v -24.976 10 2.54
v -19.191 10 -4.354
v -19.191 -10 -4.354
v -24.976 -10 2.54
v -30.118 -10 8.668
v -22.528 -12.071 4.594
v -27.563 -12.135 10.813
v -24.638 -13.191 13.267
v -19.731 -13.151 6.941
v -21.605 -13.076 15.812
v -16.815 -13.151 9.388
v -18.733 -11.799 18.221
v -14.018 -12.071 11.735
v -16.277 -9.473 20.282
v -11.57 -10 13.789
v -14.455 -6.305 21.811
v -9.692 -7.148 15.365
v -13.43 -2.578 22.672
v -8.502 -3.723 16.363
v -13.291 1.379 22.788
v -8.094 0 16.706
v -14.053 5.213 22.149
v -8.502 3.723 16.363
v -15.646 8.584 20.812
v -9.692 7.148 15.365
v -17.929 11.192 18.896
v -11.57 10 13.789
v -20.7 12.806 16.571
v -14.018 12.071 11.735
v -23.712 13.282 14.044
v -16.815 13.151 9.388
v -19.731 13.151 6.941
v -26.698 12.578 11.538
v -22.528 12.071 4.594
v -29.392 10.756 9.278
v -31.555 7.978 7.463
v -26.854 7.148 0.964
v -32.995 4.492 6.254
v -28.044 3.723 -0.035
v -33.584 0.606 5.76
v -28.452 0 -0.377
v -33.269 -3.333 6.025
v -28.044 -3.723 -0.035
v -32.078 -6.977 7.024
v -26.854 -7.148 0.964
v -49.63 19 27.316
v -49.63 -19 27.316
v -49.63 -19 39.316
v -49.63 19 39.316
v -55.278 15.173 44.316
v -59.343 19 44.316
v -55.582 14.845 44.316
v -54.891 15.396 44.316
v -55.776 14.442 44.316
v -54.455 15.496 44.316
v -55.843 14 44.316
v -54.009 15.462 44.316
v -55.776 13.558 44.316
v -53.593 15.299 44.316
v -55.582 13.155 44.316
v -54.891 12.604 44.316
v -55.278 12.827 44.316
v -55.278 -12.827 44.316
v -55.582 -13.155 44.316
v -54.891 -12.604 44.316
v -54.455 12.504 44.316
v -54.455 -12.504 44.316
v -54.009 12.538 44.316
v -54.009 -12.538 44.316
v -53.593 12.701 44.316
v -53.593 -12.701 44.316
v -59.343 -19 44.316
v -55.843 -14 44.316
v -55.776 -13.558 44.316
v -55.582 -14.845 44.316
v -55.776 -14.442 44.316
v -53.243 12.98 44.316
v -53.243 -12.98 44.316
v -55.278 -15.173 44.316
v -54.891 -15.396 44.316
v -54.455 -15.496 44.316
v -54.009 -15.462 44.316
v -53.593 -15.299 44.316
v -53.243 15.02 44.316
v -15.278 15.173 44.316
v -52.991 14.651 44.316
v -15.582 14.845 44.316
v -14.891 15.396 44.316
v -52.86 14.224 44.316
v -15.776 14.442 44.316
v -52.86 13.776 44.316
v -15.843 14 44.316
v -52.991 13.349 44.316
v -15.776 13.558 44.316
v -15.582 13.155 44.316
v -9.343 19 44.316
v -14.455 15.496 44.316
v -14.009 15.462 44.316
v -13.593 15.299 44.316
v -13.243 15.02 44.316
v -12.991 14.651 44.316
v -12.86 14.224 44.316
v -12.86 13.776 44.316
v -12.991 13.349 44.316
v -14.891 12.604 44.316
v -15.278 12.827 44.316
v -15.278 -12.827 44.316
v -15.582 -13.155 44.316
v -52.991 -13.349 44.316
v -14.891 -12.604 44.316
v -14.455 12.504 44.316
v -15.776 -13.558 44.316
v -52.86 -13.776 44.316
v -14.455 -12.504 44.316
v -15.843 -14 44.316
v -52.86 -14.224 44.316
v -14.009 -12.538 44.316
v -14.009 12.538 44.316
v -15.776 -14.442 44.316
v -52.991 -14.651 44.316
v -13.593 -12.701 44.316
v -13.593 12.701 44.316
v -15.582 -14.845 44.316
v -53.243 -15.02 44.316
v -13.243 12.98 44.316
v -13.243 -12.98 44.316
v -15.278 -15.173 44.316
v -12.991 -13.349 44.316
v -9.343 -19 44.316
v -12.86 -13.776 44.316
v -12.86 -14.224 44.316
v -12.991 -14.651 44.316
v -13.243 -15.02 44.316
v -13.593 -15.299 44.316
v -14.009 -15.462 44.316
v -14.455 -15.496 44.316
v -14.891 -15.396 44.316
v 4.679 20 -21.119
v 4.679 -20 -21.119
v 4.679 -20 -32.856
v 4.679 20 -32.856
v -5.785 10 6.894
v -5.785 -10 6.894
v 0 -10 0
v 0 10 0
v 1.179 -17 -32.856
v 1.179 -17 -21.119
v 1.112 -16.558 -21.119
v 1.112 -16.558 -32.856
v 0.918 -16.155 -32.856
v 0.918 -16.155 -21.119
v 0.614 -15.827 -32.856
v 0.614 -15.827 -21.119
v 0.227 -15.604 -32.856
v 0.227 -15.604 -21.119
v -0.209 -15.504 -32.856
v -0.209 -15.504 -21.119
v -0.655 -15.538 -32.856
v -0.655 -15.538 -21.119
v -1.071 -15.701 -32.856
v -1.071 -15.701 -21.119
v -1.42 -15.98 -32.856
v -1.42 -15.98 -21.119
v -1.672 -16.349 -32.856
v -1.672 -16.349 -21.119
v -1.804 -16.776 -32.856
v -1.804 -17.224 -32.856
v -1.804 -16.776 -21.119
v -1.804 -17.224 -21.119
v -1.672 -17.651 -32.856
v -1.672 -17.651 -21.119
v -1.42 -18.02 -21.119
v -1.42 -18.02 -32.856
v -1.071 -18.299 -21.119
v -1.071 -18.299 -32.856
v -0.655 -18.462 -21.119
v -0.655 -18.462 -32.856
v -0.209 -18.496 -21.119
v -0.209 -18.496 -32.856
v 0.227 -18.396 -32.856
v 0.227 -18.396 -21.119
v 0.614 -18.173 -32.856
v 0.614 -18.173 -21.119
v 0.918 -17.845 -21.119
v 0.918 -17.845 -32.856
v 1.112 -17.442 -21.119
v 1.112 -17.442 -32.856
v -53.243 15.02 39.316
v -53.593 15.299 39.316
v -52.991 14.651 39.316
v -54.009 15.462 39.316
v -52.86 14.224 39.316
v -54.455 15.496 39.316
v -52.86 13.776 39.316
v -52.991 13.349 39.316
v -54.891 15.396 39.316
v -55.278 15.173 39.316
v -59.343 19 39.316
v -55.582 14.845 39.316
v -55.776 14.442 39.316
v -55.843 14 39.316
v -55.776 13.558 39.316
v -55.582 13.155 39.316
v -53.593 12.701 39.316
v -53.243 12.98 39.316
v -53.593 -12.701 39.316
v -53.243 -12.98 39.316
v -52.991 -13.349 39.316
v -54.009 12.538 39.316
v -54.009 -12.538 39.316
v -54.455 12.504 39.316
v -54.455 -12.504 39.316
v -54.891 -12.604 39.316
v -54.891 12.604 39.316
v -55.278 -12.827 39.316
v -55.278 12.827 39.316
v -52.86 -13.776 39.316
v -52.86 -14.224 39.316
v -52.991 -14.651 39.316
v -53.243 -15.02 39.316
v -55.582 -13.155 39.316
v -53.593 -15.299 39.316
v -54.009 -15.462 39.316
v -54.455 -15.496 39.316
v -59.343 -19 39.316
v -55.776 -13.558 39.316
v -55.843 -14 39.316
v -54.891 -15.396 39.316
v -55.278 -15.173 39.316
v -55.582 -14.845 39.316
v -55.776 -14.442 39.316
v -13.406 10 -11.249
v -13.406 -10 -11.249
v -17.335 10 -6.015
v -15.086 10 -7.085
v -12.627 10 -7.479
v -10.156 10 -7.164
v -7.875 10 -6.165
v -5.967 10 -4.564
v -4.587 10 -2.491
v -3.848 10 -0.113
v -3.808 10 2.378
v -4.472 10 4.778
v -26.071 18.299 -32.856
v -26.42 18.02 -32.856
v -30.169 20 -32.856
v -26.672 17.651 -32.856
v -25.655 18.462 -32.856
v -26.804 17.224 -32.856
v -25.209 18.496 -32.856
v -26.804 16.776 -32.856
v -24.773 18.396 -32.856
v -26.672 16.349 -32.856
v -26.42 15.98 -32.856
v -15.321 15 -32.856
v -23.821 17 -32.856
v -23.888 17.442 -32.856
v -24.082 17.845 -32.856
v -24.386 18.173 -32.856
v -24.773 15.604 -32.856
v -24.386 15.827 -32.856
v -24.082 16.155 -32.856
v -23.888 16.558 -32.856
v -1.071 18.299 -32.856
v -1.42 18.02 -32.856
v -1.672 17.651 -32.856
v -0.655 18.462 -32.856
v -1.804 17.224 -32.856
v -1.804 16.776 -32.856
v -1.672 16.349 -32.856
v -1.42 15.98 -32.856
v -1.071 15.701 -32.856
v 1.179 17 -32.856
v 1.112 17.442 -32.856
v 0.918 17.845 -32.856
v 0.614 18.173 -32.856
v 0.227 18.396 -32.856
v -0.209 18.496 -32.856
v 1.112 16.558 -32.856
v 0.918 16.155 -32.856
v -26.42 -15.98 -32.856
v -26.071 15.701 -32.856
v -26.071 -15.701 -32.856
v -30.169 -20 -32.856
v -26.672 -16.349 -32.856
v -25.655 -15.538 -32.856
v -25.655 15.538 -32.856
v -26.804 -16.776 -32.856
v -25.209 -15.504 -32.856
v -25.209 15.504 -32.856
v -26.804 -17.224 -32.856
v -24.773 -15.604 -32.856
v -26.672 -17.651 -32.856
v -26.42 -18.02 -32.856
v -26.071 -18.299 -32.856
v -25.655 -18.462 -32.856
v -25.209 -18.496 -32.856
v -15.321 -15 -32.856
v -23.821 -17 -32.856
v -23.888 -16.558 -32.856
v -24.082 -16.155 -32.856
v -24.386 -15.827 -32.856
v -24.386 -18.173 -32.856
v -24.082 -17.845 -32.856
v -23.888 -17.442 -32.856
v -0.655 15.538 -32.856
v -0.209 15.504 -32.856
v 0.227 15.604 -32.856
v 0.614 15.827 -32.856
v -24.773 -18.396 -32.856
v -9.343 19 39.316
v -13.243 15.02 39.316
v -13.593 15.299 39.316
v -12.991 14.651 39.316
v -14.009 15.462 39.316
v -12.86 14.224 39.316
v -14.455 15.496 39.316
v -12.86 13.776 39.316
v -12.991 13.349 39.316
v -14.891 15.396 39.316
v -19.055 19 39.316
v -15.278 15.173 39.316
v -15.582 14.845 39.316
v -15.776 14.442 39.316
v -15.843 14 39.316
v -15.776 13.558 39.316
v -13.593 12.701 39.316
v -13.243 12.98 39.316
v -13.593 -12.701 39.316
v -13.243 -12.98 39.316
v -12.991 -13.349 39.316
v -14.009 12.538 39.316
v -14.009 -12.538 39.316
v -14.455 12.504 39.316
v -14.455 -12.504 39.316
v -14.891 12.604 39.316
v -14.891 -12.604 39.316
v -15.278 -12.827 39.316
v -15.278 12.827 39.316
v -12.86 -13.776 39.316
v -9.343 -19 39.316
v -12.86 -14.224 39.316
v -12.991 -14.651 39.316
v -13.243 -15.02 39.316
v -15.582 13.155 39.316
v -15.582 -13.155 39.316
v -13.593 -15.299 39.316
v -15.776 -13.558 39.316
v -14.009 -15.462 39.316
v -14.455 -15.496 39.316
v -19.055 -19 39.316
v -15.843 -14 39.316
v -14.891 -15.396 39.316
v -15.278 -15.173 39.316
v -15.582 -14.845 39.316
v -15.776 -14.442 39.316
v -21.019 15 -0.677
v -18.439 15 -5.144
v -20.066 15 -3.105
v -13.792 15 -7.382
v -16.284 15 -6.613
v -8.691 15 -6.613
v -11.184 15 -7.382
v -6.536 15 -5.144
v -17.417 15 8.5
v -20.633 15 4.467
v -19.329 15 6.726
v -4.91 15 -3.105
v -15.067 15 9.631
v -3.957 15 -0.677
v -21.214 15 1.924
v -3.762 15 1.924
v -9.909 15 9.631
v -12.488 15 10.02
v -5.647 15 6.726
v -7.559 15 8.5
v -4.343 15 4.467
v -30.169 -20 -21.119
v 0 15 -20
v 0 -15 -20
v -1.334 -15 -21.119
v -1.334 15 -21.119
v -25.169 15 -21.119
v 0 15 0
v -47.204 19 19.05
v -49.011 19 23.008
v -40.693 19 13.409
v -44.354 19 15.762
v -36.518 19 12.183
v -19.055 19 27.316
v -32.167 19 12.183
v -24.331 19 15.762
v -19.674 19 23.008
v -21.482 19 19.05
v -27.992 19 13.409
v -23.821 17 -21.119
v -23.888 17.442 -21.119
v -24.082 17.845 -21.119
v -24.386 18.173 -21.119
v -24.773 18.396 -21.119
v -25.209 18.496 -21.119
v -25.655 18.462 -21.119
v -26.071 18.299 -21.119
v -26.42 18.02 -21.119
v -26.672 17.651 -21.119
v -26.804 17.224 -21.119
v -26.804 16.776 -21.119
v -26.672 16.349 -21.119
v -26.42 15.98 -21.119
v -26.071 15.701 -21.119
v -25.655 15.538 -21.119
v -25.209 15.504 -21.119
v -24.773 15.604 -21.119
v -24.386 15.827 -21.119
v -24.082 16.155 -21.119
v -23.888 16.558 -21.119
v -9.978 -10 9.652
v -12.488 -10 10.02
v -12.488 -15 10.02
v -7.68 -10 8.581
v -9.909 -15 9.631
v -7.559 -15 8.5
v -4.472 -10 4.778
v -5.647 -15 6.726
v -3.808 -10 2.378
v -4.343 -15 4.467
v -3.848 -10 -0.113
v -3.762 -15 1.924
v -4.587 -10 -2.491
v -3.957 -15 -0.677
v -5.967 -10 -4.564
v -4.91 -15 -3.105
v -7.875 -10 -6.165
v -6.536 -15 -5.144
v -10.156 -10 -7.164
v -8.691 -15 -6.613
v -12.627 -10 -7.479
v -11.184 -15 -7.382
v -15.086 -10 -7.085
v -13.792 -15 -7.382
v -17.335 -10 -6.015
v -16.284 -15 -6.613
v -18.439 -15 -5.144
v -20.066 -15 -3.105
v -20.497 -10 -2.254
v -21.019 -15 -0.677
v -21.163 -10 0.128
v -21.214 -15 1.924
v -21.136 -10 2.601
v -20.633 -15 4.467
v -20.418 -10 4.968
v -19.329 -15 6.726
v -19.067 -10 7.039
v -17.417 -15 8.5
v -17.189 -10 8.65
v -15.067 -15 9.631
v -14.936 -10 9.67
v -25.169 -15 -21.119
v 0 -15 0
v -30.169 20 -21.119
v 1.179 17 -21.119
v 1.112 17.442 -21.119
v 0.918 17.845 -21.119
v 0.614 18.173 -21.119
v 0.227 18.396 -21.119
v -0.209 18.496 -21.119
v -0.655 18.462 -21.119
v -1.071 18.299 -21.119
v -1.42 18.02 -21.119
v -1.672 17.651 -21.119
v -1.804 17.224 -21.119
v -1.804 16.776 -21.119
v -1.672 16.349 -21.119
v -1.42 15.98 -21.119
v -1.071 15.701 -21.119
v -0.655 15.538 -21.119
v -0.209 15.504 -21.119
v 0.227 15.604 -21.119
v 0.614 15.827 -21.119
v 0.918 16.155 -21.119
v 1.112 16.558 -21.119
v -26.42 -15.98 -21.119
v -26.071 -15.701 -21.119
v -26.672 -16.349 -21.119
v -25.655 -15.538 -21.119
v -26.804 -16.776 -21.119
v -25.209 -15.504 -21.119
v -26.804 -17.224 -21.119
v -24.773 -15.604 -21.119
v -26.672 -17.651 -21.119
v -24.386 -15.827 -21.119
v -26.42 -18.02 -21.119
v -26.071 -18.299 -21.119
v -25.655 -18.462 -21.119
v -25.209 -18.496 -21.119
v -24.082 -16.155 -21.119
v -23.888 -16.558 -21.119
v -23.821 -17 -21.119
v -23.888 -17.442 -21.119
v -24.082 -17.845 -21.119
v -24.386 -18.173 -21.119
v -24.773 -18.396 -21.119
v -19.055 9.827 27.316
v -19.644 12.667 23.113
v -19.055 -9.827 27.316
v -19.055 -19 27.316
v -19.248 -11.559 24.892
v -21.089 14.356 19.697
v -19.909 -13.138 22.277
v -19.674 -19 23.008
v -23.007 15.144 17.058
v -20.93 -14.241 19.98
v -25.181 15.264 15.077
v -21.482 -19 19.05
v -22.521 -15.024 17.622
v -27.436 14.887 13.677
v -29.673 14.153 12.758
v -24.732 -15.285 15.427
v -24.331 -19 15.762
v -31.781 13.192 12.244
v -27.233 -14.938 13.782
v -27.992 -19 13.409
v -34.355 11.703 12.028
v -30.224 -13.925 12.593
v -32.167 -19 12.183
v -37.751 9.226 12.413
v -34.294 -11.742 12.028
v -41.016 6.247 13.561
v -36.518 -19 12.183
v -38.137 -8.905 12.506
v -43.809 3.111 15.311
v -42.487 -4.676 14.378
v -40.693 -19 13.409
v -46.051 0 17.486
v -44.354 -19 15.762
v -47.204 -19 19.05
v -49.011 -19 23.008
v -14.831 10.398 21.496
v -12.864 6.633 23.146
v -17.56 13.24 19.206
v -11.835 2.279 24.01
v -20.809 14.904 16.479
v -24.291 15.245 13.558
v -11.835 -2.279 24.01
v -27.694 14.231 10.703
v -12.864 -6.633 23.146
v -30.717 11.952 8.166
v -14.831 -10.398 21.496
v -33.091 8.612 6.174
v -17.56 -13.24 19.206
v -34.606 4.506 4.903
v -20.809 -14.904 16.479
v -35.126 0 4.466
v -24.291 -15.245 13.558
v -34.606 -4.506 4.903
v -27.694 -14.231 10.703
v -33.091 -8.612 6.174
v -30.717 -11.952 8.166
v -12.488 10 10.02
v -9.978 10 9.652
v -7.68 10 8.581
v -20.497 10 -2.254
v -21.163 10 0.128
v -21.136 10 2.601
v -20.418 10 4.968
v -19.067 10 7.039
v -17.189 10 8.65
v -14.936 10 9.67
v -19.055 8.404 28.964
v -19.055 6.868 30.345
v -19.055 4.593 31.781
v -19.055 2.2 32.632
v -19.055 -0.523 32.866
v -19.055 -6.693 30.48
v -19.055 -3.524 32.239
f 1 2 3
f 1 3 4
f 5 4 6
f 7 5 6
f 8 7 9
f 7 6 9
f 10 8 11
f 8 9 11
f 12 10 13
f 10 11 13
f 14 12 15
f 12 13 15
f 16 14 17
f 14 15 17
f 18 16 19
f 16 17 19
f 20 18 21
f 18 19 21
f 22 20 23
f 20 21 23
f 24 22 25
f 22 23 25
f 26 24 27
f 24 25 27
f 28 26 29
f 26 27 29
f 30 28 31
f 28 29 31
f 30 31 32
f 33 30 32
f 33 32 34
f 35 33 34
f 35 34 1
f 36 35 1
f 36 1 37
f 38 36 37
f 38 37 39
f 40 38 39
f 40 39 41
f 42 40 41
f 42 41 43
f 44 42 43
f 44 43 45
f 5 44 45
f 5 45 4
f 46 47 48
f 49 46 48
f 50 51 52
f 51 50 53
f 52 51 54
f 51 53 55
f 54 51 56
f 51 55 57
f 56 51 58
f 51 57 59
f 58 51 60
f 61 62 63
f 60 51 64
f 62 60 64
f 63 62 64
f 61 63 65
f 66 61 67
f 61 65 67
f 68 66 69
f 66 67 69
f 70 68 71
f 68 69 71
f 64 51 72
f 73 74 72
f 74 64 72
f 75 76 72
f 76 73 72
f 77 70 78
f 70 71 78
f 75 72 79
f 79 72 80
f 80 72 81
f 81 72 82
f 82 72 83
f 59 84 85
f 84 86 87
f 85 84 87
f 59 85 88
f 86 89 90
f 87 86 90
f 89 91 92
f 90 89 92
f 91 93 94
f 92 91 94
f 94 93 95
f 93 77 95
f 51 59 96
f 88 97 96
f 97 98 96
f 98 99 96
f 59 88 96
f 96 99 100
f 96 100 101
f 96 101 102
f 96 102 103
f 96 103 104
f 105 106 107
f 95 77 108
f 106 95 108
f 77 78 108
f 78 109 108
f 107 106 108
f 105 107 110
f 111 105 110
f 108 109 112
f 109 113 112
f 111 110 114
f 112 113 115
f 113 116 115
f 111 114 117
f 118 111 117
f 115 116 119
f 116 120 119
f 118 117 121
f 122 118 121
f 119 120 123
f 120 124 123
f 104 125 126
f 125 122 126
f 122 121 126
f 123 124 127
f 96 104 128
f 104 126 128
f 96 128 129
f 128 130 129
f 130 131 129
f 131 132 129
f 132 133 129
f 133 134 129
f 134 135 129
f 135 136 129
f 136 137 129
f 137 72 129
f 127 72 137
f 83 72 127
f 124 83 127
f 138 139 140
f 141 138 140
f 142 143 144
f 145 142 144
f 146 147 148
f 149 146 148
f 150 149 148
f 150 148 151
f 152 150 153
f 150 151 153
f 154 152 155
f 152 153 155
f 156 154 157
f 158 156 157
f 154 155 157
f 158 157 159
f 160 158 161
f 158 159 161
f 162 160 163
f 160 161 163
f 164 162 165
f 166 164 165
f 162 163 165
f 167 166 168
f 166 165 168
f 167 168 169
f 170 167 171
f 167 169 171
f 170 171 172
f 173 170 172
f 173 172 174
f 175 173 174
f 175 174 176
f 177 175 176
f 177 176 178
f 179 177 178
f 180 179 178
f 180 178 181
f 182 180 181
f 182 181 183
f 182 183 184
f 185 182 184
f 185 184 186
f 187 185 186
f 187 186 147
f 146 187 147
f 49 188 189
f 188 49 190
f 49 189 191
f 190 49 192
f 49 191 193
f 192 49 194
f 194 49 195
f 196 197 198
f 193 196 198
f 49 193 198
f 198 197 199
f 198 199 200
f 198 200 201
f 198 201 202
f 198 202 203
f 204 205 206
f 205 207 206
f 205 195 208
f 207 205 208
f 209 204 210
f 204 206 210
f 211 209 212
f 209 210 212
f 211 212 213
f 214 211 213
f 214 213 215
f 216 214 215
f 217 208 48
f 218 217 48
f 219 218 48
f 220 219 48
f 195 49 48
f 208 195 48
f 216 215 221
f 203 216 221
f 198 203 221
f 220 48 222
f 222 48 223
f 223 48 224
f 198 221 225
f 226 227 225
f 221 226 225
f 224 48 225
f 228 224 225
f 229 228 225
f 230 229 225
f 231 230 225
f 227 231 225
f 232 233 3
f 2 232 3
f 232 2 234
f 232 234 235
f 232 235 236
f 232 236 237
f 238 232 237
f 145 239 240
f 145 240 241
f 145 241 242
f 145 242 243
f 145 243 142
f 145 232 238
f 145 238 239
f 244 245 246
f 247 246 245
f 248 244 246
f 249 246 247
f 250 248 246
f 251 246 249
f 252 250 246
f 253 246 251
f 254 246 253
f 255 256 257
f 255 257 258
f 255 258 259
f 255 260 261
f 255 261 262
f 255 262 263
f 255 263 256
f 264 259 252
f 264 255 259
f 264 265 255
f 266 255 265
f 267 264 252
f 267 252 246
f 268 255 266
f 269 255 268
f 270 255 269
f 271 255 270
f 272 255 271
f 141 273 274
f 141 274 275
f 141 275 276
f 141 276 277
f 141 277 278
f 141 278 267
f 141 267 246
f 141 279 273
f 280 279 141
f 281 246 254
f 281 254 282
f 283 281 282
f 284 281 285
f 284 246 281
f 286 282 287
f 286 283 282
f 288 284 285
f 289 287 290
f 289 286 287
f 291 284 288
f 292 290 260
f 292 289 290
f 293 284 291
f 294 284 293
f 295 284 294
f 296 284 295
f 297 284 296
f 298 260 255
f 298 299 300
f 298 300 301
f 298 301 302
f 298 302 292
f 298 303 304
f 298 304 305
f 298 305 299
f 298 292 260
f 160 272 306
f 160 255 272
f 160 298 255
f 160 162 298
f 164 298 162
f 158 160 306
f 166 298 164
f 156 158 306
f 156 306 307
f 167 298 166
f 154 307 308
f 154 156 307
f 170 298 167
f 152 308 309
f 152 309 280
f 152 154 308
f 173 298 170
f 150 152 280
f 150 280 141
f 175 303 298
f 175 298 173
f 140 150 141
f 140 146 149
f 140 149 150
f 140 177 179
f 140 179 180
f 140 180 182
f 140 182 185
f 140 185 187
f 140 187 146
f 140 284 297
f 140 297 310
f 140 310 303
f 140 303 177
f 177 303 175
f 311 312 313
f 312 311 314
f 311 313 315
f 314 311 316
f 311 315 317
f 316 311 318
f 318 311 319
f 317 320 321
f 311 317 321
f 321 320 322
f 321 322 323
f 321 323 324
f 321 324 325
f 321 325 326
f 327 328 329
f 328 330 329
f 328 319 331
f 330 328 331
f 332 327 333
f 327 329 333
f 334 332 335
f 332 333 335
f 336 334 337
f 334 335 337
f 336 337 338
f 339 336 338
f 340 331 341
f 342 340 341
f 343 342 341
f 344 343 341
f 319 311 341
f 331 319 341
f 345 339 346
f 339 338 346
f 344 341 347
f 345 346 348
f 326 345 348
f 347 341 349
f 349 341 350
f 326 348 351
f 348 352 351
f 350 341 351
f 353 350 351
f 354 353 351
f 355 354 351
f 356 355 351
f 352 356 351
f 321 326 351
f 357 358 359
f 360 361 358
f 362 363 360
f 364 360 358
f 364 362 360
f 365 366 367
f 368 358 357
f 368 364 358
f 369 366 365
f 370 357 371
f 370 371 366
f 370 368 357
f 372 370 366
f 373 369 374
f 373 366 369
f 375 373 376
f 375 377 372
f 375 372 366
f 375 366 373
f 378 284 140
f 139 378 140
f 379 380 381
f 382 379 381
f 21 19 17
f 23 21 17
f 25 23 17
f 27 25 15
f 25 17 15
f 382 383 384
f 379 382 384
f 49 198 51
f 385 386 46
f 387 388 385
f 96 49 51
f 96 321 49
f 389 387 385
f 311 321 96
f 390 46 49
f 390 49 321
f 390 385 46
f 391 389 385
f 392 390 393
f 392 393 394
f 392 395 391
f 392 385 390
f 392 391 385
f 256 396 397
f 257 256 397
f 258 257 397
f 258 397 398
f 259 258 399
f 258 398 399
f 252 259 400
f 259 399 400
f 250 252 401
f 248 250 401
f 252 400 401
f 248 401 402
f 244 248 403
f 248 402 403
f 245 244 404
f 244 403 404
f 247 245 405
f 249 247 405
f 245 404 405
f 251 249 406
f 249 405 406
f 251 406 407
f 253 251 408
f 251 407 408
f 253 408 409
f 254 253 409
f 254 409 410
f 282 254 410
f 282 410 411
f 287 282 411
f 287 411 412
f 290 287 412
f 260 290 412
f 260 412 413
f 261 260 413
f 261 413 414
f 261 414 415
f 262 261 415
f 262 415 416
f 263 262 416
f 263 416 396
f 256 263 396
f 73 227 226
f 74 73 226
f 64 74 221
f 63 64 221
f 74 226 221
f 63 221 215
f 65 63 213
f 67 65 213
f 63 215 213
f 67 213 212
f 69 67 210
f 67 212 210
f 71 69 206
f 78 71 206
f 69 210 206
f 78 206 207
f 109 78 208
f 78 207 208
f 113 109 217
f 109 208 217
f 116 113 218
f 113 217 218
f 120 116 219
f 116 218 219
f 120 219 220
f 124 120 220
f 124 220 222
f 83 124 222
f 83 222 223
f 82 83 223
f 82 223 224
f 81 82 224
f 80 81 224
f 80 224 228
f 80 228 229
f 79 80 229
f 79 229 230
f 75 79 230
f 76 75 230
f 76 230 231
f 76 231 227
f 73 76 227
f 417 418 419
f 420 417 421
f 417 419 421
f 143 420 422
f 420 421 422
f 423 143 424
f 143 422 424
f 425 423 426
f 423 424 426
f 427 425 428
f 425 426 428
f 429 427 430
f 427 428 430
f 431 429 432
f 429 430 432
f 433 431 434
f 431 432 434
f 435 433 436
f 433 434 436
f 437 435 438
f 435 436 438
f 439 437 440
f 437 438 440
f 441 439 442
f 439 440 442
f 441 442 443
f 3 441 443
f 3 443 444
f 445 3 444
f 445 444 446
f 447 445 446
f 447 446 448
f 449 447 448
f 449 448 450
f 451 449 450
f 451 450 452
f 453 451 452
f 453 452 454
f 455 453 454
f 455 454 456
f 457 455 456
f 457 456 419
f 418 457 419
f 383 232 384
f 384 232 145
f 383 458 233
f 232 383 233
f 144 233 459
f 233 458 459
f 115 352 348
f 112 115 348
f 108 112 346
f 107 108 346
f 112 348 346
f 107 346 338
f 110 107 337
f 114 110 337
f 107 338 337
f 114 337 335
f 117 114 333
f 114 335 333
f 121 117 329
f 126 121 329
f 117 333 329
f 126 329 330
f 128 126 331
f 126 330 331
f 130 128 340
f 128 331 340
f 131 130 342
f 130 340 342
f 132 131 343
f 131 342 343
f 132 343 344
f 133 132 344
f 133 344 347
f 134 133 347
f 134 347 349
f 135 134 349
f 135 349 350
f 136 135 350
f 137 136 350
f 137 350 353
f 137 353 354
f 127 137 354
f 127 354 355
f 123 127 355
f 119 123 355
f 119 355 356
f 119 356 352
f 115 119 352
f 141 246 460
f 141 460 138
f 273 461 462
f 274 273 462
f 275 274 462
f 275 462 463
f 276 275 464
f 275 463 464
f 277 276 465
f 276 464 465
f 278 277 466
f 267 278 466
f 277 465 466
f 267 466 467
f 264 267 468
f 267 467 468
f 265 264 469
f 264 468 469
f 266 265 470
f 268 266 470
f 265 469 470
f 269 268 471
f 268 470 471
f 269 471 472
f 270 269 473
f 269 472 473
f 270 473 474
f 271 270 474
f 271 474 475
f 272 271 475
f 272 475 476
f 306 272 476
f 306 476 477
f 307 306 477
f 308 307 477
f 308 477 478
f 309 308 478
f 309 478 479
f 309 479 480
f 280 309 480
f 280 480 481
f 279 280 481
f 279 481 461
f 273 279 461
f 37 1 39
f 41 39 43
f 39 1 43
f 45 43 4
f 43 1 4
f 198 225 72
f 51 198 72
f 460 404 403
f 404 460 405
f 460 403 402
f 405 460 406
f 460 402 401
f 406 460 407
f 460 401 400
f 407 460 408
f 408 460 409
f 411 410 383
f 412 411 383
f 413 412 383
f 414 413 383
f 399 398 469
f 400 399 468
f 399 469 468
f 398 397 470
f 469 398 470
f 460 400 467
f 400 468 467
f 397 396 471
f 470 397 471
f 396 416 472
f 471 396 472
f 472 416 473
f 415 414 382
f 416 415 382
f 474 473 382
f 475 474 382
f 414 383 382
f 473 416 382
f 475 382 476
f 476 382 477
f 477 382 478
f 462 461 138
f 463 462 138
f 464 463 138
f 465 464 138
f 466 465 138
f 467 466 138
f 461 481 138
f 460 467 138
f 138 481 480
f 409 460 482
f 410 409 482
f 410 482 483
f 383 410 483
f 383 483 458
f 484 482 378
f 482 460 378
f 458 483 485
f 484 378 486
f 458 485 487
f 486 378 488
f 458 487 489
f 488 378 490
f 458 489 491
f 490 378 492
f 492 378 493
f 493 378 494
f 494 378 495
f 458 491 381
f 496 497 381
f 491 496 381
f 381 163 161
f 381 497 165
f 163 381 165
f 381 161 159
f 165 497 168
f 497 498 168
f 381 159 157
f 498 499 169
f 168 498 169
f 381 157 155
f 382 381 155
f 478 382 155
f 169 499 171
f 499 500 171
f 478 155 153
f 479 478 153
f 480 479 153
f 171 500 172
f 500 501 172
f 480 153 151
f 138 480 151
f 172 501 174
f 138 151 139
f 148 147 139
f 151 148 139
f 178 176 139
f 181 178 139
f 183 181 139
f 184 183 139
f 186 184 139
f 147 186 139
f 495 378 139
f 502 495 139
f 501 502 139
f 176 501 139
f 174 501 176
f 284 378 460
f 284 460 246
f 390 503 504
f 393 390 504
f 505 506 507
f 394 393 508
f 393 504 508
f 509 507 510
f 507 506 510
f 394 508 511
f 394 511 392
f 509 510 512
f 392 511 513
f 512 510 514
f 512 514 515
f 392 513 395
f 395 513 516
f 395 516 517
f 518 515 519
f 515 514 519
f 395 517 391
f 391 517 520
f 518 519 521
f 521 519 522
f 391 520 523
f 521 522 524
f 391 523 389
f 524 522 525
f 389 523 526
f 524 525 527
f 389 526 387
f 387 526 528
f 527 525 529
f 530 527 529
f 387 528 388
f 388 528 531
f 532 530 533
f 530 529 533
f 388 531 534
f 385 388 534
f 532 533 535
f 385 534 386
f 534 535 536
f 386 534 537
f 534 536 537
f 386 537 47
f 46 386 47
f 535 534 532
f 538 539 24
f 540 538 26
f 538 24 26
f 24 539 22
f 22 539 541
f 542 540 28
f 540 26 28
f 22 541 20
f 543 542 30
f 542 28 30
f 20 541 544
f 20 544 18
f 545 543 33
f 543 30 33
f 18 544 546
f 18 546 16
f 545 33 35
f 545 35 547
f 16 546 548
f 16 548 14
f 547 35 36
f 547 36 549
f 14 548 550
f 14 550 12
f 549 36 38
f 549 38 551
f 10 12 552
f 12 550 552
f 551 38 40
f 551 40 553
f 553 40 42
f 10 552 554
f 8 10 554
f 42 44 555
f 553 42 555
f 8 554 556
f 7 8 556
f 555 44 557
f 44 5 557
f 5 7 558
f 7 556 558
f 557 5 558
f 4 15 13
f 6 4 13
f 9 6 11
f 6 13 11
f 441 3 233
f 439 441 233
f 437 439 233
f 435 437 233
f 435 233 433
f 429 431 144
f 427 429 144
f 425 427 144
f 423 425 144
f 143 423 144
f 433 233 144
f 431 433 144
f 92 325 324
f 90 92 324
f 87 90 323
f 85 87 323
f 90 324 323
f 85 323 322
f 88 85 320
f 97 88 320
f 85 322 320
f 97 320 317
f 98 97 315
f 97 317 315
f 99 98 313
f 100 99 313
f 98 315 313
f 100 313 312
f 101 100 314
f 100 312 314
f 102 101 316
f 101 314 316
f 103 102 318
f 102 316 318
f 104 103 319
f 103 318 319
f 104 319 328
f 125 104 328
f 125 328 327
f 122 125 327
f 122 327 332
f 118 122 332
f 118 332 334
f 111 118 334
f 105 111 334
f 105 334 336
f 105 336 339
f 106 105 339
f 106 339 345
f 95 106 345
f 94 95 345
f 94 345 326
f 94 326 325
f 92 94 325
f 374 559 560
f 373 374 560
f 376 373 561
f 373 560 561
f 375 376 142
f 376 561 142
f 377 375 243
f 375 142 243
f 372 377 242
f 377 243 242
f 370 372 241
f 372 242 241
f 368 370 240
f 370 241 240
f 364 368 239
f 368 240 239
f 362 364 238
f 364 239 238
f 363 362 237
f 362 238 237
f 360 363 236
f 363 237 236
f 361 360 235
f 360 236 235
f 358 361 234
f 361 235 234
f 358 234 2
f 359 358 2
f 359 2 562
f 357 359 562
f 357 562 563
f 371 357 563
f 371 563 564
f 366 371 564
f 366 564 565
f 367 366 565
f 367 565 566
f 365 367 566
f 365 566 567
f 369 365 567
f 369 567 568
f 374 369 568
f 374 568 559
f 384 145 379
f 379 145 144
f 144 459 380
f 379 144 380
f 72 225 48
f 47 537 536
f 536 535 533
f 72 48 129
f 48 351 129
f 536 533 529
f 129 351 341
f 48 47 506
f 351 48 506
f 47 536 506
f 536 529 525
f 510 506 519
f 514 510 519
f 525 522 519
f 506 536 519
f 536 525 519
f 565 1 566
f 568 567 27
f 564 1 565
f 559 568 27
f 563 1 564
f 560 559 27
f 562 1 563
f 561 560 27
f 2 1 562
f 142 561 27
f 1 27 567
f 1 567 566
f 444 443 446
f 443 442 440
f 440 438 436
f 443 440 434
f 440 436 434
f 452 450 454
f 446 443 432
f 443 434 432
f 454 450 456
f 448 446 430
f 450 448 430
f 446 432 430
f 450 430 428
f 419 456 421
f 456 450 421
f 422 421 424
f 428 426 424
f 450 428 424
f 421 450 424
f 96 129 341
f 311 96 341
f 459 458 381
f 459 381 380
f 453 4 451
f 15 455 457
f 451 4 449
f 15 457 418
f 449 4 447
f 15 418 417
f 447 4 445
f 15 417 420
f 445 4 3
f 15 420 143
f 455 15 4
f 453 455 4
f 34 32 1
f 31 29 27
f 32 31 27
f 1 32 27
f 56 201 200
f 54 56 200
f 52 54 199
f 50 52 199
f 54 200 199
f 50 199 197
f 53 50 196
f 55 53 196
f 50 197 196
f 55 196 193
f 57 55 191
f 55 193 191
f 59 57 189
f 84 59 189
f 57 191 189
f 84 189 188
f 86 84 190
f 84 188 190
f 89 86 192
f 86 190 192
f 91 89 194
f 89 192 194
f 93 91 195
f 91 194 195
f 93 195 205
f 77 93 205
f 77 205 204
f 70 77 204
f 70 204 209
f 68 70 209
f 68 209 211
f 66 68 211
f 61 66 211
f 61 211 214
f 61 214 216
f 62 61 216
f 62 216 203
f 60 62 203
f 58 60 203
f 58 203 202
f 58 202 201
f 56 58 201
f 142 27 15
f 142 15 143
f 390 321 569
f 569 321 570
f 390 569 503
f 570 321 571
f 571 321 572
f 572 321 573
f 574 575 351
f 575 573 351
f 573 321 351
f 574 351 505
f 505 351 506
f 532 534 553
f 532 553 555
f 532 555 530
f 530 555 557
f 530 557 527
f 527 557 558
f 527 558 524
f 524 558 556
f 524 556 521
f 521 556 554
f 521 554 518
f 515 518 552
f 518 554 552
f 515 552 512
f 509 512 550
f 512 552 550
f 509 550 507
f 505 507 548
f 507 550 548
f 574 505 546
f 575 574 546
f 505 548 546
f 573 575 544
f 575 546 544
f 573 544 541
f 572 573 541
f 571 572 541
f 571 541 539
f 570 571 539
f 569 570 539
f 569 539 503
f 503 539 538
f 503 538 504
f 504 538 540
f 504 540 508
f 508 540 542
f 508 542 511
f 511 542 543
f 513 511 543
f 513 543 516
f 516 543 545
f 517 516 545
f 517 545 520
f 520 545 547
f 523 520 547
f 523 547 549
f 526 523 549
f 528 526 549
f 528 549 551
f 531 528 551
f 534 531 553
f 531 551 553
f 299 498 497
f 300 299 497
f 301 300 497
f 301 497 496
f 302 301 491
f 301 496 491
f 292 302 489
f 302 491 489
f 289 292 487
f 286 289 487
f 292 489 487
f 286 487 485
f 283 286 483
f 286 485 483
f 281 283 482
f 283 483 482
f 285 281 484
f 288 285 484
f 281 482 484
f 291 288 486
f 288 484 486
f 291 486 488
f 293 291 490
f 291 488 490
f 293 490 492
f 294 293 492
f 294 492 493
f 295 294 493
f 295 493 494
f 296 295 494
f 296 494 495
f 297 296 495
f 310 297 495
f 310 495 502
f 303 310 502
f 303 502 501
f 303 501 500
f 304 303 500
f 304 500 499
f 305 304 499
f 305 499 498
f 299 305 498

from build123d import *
from build123d.topology import SkipClean

# Parameters (mm, degrees)
SALIENTE_EXTRUIR1_DEPTH       = 15
SALIENTE_EXTRUIR1_DEPTH_BACK  = 15
SALIENTE_EXTRUIR3_DEPTH       = 10
SALIENTE_EXTRUIR3_DEPTH_BACK  = 10
SALIENTE_EXTRUIR9_DEPTH       = 5
SALIENTE_EXTRUIR9_DEPTH_BACK  = 25
CROQUIS4_R                    = 8.75
SALIENTE_EXTRUIR10_DEPTH      = 10
SALIENTE_EXTRUIR10_DEPTH_BACK = 10
CROQUIS6_R                    = 13.287682266
SALIENTE_EXTRUIR11_DEPTH      = 8
CROQUIS7_R                    = 15.287682266
SALIENTE_EXTRUIR12_DEPTH      = 17
SALIENTE_EXTRUIR13_DEPTH      = 17
SALIENTE_EXTRUIR13_DEPTH_BACK = 17
CROQUIS9_R                    = 15.287682266
SALIENTE_EXTRUIR14_DEPTH      = 2
SALIENTE_EXTRUIR14_DEPTH_BACK = 36
SALIENTE_EXTRUIR15_DEPTH      = 5
SALIENTE_EXTRUIR15_DEPTH_BACK = 35
CROQUIS11_W                   = 34.848077531
CROQUIS11_H                   = 11.736481777
CROQUIS12_R                   = 1.5
CORTAR_EXTRUIR1_DEPTH         = 35000
CROQUIS13_R                   = 1.5
CORTAR_EXTRUIR2_DEPTH         = 35000


with BuildPart() as part:
    # Croquis1 → Saliente-Extruir1 (new, two sides: drawn at the far end of the back side and taken through both)
    with BuildSketch(Plane(origin=(0, 0, 0), x_dir=(1, 0, 0), z_dir=(0, 1, 0)).offset(-SALIENTE_EXTRUIR1_DEPTH_BACK)):
        Polygon((0, 0), (0, 20), (-15.320888862, 32.855752194), (-25.168966393, 21.119270417), align=None)
    extrude(amount=SALIENTE_EXTRUIR1_DEPTH + SALIENTE_EXTRUIR1_DEPTH_BACK)

    # Croquis2 → Saliente-Extruir3 (add, two sides: drawn at the far end of the back side and taken through both)
    with BuildSketch(Plane(origin=(0, 0, 0), x_dir=(1, 0, 0), z_dir=(0, 1, 0)).offset(-SALIENTE_EXTRUIR3_DEPTH_BACK)):
        with BuildLine():
            Line((0, 0), (-13.405777755, 11.24878317))
            Line((-13.405777755, 11.24878317), (-19.190866242, 4.354383181))
            ThreePointArc((-19.190866242, 4.354383181), (-18.112368949, -7.972897281), (-5.785088487, -6.894399988))
            Line((-5.785088487, -6.894399988), (0, 0))
        make_face()
    extrude(amount=SALIENTE_EXTRUIR3_DEPTH + SALIENTE_EXTRUIR3_DEPTH_BACK)

    # Croquis4 → Saliente-Extruir9 (add, two sides: drawn at the far end of the back side and taken through both)
    with SkipClean():  # the faces are left unmerged after this step: merging them gives an invalid solid
        with BuildSketch(Plane(origin=(0, 10, 0), x_dir=(1, 0, 0), z_dir=(0, 1, 0)).offset(-SALIENTE_EXTRUIR9_DEPTH_BACK)):
            with Locations((-12.487977364, -1.270008403)):
                Circle(CROQUIS4_R)
        extrude(amount=SALIENTE_EXTRUIR9_DEPTH + SALIENTE_EXTRUIR9_DEPTH_BACK)

    # Croquis5 → Saliente-Extruir10 (add, two sides: drawn at the far end of the back side and taken through both)
    with BuildSketch(Plane(origin=(0, 0, 0), x_dir=(1, 0, 0), z_dir=(0, 1, 0)).offset(-SALIENTE_EXTRUIR10_DEPTH_BACK)):
        with BuildLine():
            Line((-11.570176974, -13.788799976), (-5.785088487, -6.894399988))
            ThreePointArc((-5.785088487, -6.894399988), (-6.86358578, 5.432880474), (-19.190866242, 4.354383181))
            Line((-19.190866242, 4.354383181), (-24.975954729, -2.540016807))
            Line((-24.975954729, -2.540016807), (-11.570176974, -13.788799976))
        make_face()
    extrude(amount=SALIENTE_EXTRUIR10_DEPTH + SALIENTE_EXTRUIR10_DEPTH_BACK)

    # Croquis6 → Saliente-Extruir11 (add)
    with BuildSketch(Plane(origin=(-11.570176974, 0, 13.788799976), x_dir=(0.7660444431189747, 0, 0.6427876096865435), z_dir=(-0.6427876096865434, 0, 0.7660444431189746))):
        with Locations((-8.75, 0)):
            Circle(CROQUIS6_R)
    extrude(amount=SALIENTE_EXTRUIR11_DEPTH)

    # Croquis7 → Saliente-Extruir12 (add)
    with BuildSketch(Plane(origin=(-16.712477852, 0, 19.917155521), x_dir=(0.7660444431189747, 0, 0.6427876096865435), z_dir=(-0.6427876096865434, 0, 0.7660444431189746))):
        with Locations((-8.75, 0)):
            Circle(CROQUIS7_R)
    extrude(amount=SALIENTE_EXTRUIR12_DEPTH)

    # Croquis9 → Saliente-Extruir13 (add, two sides: drawn at the far end of the back side and taken through both)
    with BuildSketch(Plane(origin=(0, 0, 0), x_dir=(1, 0, 0), z_dir=(0, 1, 0)).offset(-SALIENTE_EXTRUIR13_DEPTH_BACK)):
        with Locations((-34.342756094, -27.315519469)):
            Circle(CROQUIS9_R)
    extrude(amount=SALIENTE_EXTRUIR13_DEPTH + SALIENTE_EXTRUIR13_DEPTH_BACK)

    # Croquis10 → Saliente-Extruir14 (add, two sides: drawn at the far end of the back side and taken through both)
    with BuildSketch(Plane(origin=(0, 17, 0), x_dir=(1, 0, 0), z_dir=(0, 1, 0)).offset(-SALIENTE_EXTRUIR14_DEPTH_BACK)):
        with BuildLine():
            Line((-49.63043836, -27.315519469), (-49.63043836, -39.315519469))
            Line((-49.63043836, -39.315519469), (-59.342756094, -39.315519469))
            Line((-59.342756094, -39.315519469), (-59.342756094, -44.315519469))
            Line((-59.342756094, -44.315519469), (-9.342756094, -44.315519469))
            Line((-9.342756094, -44.315519469), (-9.342756094, -39.315519469))
            Line((-9.342756094, -39.315519469), (-19.055073828, -39.315519469))
            Line((-19.055073828, -39.315519469), (-19.055073828, -27.315519469))
            ThreePointArc((-19.055073828, -27.315519469), (-34.342756094, -12.027837203), (-49.63043836, -27.315519469))
        make_face()
    extrude(amount=SALIENTE_EXTRUIR14_DEPTH + SALIENTE_EXTRUIR14_DEPTH_BACK)

    # Croquis11 → Saliente-Extruir15 (add, two sides: drawn at the far end of the back side and taken through both)
    with BuildSketch(Plane(origin=(0, 15, 0), x_dir=(1, 0, 0), z_dir=(0, 1, 0)).offset(-SALIENTE_EXTRUIR15_DEPTH_BACK)):
        with Locations((-12.744927628, 26.987511306)):
            Rectangle(CROQUIS11_W, CROQUIS11_H)
    extrude(amount=SALIENTE_EXTRUIR15_DEPTH + SALIENTE_EXTRUIR15_DEPTH_BACK)

    # Croquis12 → Cortar-Extruir1 (cut)
    with BuildSketch(Plane.XY.offset(-21.119270417)):
        with Locations((-0.320888862, 17)):
            Circle(CROQUIS12_R)
        with Locations((-25.320888862, 17)):
            Circle(CROQUIS12_R)
        with Locations((-25.320888862, -17)):
            Circle(CROQUIS12_R)
        with Locations((-0.320888862, -17)):
            Circle(CROQUIS12_R)
    extrude(amount=-CORTAR_EXTRUIR1_DEPTH, mode=Mode.SUBTRACT)

    # Croquis13 → Cortar-Extruir2 (cut)
    with BuildSketch(Plane(origin=(0, 0, 39.315519469), x_dir=(-1, 0, 0), z_dir=(0, 0, -1))):
        with Locations((54.342756094, 14)):
            Circle(CROQUIS13_R)
        with Locations((54.342756094, -14)):
            Circle(CROQUIS13_R)
        with Locations((14.342756094, 14)):
            Circle(CROQUIS13_R)
        with Locations((14.342756094, -14)):
            Circle(CROQUIS13_R)
    extrude(amount=-CORTAR_EXTRUIR2_DEPTH, mode=Mode.SUBTRACT)


solid = part.part
